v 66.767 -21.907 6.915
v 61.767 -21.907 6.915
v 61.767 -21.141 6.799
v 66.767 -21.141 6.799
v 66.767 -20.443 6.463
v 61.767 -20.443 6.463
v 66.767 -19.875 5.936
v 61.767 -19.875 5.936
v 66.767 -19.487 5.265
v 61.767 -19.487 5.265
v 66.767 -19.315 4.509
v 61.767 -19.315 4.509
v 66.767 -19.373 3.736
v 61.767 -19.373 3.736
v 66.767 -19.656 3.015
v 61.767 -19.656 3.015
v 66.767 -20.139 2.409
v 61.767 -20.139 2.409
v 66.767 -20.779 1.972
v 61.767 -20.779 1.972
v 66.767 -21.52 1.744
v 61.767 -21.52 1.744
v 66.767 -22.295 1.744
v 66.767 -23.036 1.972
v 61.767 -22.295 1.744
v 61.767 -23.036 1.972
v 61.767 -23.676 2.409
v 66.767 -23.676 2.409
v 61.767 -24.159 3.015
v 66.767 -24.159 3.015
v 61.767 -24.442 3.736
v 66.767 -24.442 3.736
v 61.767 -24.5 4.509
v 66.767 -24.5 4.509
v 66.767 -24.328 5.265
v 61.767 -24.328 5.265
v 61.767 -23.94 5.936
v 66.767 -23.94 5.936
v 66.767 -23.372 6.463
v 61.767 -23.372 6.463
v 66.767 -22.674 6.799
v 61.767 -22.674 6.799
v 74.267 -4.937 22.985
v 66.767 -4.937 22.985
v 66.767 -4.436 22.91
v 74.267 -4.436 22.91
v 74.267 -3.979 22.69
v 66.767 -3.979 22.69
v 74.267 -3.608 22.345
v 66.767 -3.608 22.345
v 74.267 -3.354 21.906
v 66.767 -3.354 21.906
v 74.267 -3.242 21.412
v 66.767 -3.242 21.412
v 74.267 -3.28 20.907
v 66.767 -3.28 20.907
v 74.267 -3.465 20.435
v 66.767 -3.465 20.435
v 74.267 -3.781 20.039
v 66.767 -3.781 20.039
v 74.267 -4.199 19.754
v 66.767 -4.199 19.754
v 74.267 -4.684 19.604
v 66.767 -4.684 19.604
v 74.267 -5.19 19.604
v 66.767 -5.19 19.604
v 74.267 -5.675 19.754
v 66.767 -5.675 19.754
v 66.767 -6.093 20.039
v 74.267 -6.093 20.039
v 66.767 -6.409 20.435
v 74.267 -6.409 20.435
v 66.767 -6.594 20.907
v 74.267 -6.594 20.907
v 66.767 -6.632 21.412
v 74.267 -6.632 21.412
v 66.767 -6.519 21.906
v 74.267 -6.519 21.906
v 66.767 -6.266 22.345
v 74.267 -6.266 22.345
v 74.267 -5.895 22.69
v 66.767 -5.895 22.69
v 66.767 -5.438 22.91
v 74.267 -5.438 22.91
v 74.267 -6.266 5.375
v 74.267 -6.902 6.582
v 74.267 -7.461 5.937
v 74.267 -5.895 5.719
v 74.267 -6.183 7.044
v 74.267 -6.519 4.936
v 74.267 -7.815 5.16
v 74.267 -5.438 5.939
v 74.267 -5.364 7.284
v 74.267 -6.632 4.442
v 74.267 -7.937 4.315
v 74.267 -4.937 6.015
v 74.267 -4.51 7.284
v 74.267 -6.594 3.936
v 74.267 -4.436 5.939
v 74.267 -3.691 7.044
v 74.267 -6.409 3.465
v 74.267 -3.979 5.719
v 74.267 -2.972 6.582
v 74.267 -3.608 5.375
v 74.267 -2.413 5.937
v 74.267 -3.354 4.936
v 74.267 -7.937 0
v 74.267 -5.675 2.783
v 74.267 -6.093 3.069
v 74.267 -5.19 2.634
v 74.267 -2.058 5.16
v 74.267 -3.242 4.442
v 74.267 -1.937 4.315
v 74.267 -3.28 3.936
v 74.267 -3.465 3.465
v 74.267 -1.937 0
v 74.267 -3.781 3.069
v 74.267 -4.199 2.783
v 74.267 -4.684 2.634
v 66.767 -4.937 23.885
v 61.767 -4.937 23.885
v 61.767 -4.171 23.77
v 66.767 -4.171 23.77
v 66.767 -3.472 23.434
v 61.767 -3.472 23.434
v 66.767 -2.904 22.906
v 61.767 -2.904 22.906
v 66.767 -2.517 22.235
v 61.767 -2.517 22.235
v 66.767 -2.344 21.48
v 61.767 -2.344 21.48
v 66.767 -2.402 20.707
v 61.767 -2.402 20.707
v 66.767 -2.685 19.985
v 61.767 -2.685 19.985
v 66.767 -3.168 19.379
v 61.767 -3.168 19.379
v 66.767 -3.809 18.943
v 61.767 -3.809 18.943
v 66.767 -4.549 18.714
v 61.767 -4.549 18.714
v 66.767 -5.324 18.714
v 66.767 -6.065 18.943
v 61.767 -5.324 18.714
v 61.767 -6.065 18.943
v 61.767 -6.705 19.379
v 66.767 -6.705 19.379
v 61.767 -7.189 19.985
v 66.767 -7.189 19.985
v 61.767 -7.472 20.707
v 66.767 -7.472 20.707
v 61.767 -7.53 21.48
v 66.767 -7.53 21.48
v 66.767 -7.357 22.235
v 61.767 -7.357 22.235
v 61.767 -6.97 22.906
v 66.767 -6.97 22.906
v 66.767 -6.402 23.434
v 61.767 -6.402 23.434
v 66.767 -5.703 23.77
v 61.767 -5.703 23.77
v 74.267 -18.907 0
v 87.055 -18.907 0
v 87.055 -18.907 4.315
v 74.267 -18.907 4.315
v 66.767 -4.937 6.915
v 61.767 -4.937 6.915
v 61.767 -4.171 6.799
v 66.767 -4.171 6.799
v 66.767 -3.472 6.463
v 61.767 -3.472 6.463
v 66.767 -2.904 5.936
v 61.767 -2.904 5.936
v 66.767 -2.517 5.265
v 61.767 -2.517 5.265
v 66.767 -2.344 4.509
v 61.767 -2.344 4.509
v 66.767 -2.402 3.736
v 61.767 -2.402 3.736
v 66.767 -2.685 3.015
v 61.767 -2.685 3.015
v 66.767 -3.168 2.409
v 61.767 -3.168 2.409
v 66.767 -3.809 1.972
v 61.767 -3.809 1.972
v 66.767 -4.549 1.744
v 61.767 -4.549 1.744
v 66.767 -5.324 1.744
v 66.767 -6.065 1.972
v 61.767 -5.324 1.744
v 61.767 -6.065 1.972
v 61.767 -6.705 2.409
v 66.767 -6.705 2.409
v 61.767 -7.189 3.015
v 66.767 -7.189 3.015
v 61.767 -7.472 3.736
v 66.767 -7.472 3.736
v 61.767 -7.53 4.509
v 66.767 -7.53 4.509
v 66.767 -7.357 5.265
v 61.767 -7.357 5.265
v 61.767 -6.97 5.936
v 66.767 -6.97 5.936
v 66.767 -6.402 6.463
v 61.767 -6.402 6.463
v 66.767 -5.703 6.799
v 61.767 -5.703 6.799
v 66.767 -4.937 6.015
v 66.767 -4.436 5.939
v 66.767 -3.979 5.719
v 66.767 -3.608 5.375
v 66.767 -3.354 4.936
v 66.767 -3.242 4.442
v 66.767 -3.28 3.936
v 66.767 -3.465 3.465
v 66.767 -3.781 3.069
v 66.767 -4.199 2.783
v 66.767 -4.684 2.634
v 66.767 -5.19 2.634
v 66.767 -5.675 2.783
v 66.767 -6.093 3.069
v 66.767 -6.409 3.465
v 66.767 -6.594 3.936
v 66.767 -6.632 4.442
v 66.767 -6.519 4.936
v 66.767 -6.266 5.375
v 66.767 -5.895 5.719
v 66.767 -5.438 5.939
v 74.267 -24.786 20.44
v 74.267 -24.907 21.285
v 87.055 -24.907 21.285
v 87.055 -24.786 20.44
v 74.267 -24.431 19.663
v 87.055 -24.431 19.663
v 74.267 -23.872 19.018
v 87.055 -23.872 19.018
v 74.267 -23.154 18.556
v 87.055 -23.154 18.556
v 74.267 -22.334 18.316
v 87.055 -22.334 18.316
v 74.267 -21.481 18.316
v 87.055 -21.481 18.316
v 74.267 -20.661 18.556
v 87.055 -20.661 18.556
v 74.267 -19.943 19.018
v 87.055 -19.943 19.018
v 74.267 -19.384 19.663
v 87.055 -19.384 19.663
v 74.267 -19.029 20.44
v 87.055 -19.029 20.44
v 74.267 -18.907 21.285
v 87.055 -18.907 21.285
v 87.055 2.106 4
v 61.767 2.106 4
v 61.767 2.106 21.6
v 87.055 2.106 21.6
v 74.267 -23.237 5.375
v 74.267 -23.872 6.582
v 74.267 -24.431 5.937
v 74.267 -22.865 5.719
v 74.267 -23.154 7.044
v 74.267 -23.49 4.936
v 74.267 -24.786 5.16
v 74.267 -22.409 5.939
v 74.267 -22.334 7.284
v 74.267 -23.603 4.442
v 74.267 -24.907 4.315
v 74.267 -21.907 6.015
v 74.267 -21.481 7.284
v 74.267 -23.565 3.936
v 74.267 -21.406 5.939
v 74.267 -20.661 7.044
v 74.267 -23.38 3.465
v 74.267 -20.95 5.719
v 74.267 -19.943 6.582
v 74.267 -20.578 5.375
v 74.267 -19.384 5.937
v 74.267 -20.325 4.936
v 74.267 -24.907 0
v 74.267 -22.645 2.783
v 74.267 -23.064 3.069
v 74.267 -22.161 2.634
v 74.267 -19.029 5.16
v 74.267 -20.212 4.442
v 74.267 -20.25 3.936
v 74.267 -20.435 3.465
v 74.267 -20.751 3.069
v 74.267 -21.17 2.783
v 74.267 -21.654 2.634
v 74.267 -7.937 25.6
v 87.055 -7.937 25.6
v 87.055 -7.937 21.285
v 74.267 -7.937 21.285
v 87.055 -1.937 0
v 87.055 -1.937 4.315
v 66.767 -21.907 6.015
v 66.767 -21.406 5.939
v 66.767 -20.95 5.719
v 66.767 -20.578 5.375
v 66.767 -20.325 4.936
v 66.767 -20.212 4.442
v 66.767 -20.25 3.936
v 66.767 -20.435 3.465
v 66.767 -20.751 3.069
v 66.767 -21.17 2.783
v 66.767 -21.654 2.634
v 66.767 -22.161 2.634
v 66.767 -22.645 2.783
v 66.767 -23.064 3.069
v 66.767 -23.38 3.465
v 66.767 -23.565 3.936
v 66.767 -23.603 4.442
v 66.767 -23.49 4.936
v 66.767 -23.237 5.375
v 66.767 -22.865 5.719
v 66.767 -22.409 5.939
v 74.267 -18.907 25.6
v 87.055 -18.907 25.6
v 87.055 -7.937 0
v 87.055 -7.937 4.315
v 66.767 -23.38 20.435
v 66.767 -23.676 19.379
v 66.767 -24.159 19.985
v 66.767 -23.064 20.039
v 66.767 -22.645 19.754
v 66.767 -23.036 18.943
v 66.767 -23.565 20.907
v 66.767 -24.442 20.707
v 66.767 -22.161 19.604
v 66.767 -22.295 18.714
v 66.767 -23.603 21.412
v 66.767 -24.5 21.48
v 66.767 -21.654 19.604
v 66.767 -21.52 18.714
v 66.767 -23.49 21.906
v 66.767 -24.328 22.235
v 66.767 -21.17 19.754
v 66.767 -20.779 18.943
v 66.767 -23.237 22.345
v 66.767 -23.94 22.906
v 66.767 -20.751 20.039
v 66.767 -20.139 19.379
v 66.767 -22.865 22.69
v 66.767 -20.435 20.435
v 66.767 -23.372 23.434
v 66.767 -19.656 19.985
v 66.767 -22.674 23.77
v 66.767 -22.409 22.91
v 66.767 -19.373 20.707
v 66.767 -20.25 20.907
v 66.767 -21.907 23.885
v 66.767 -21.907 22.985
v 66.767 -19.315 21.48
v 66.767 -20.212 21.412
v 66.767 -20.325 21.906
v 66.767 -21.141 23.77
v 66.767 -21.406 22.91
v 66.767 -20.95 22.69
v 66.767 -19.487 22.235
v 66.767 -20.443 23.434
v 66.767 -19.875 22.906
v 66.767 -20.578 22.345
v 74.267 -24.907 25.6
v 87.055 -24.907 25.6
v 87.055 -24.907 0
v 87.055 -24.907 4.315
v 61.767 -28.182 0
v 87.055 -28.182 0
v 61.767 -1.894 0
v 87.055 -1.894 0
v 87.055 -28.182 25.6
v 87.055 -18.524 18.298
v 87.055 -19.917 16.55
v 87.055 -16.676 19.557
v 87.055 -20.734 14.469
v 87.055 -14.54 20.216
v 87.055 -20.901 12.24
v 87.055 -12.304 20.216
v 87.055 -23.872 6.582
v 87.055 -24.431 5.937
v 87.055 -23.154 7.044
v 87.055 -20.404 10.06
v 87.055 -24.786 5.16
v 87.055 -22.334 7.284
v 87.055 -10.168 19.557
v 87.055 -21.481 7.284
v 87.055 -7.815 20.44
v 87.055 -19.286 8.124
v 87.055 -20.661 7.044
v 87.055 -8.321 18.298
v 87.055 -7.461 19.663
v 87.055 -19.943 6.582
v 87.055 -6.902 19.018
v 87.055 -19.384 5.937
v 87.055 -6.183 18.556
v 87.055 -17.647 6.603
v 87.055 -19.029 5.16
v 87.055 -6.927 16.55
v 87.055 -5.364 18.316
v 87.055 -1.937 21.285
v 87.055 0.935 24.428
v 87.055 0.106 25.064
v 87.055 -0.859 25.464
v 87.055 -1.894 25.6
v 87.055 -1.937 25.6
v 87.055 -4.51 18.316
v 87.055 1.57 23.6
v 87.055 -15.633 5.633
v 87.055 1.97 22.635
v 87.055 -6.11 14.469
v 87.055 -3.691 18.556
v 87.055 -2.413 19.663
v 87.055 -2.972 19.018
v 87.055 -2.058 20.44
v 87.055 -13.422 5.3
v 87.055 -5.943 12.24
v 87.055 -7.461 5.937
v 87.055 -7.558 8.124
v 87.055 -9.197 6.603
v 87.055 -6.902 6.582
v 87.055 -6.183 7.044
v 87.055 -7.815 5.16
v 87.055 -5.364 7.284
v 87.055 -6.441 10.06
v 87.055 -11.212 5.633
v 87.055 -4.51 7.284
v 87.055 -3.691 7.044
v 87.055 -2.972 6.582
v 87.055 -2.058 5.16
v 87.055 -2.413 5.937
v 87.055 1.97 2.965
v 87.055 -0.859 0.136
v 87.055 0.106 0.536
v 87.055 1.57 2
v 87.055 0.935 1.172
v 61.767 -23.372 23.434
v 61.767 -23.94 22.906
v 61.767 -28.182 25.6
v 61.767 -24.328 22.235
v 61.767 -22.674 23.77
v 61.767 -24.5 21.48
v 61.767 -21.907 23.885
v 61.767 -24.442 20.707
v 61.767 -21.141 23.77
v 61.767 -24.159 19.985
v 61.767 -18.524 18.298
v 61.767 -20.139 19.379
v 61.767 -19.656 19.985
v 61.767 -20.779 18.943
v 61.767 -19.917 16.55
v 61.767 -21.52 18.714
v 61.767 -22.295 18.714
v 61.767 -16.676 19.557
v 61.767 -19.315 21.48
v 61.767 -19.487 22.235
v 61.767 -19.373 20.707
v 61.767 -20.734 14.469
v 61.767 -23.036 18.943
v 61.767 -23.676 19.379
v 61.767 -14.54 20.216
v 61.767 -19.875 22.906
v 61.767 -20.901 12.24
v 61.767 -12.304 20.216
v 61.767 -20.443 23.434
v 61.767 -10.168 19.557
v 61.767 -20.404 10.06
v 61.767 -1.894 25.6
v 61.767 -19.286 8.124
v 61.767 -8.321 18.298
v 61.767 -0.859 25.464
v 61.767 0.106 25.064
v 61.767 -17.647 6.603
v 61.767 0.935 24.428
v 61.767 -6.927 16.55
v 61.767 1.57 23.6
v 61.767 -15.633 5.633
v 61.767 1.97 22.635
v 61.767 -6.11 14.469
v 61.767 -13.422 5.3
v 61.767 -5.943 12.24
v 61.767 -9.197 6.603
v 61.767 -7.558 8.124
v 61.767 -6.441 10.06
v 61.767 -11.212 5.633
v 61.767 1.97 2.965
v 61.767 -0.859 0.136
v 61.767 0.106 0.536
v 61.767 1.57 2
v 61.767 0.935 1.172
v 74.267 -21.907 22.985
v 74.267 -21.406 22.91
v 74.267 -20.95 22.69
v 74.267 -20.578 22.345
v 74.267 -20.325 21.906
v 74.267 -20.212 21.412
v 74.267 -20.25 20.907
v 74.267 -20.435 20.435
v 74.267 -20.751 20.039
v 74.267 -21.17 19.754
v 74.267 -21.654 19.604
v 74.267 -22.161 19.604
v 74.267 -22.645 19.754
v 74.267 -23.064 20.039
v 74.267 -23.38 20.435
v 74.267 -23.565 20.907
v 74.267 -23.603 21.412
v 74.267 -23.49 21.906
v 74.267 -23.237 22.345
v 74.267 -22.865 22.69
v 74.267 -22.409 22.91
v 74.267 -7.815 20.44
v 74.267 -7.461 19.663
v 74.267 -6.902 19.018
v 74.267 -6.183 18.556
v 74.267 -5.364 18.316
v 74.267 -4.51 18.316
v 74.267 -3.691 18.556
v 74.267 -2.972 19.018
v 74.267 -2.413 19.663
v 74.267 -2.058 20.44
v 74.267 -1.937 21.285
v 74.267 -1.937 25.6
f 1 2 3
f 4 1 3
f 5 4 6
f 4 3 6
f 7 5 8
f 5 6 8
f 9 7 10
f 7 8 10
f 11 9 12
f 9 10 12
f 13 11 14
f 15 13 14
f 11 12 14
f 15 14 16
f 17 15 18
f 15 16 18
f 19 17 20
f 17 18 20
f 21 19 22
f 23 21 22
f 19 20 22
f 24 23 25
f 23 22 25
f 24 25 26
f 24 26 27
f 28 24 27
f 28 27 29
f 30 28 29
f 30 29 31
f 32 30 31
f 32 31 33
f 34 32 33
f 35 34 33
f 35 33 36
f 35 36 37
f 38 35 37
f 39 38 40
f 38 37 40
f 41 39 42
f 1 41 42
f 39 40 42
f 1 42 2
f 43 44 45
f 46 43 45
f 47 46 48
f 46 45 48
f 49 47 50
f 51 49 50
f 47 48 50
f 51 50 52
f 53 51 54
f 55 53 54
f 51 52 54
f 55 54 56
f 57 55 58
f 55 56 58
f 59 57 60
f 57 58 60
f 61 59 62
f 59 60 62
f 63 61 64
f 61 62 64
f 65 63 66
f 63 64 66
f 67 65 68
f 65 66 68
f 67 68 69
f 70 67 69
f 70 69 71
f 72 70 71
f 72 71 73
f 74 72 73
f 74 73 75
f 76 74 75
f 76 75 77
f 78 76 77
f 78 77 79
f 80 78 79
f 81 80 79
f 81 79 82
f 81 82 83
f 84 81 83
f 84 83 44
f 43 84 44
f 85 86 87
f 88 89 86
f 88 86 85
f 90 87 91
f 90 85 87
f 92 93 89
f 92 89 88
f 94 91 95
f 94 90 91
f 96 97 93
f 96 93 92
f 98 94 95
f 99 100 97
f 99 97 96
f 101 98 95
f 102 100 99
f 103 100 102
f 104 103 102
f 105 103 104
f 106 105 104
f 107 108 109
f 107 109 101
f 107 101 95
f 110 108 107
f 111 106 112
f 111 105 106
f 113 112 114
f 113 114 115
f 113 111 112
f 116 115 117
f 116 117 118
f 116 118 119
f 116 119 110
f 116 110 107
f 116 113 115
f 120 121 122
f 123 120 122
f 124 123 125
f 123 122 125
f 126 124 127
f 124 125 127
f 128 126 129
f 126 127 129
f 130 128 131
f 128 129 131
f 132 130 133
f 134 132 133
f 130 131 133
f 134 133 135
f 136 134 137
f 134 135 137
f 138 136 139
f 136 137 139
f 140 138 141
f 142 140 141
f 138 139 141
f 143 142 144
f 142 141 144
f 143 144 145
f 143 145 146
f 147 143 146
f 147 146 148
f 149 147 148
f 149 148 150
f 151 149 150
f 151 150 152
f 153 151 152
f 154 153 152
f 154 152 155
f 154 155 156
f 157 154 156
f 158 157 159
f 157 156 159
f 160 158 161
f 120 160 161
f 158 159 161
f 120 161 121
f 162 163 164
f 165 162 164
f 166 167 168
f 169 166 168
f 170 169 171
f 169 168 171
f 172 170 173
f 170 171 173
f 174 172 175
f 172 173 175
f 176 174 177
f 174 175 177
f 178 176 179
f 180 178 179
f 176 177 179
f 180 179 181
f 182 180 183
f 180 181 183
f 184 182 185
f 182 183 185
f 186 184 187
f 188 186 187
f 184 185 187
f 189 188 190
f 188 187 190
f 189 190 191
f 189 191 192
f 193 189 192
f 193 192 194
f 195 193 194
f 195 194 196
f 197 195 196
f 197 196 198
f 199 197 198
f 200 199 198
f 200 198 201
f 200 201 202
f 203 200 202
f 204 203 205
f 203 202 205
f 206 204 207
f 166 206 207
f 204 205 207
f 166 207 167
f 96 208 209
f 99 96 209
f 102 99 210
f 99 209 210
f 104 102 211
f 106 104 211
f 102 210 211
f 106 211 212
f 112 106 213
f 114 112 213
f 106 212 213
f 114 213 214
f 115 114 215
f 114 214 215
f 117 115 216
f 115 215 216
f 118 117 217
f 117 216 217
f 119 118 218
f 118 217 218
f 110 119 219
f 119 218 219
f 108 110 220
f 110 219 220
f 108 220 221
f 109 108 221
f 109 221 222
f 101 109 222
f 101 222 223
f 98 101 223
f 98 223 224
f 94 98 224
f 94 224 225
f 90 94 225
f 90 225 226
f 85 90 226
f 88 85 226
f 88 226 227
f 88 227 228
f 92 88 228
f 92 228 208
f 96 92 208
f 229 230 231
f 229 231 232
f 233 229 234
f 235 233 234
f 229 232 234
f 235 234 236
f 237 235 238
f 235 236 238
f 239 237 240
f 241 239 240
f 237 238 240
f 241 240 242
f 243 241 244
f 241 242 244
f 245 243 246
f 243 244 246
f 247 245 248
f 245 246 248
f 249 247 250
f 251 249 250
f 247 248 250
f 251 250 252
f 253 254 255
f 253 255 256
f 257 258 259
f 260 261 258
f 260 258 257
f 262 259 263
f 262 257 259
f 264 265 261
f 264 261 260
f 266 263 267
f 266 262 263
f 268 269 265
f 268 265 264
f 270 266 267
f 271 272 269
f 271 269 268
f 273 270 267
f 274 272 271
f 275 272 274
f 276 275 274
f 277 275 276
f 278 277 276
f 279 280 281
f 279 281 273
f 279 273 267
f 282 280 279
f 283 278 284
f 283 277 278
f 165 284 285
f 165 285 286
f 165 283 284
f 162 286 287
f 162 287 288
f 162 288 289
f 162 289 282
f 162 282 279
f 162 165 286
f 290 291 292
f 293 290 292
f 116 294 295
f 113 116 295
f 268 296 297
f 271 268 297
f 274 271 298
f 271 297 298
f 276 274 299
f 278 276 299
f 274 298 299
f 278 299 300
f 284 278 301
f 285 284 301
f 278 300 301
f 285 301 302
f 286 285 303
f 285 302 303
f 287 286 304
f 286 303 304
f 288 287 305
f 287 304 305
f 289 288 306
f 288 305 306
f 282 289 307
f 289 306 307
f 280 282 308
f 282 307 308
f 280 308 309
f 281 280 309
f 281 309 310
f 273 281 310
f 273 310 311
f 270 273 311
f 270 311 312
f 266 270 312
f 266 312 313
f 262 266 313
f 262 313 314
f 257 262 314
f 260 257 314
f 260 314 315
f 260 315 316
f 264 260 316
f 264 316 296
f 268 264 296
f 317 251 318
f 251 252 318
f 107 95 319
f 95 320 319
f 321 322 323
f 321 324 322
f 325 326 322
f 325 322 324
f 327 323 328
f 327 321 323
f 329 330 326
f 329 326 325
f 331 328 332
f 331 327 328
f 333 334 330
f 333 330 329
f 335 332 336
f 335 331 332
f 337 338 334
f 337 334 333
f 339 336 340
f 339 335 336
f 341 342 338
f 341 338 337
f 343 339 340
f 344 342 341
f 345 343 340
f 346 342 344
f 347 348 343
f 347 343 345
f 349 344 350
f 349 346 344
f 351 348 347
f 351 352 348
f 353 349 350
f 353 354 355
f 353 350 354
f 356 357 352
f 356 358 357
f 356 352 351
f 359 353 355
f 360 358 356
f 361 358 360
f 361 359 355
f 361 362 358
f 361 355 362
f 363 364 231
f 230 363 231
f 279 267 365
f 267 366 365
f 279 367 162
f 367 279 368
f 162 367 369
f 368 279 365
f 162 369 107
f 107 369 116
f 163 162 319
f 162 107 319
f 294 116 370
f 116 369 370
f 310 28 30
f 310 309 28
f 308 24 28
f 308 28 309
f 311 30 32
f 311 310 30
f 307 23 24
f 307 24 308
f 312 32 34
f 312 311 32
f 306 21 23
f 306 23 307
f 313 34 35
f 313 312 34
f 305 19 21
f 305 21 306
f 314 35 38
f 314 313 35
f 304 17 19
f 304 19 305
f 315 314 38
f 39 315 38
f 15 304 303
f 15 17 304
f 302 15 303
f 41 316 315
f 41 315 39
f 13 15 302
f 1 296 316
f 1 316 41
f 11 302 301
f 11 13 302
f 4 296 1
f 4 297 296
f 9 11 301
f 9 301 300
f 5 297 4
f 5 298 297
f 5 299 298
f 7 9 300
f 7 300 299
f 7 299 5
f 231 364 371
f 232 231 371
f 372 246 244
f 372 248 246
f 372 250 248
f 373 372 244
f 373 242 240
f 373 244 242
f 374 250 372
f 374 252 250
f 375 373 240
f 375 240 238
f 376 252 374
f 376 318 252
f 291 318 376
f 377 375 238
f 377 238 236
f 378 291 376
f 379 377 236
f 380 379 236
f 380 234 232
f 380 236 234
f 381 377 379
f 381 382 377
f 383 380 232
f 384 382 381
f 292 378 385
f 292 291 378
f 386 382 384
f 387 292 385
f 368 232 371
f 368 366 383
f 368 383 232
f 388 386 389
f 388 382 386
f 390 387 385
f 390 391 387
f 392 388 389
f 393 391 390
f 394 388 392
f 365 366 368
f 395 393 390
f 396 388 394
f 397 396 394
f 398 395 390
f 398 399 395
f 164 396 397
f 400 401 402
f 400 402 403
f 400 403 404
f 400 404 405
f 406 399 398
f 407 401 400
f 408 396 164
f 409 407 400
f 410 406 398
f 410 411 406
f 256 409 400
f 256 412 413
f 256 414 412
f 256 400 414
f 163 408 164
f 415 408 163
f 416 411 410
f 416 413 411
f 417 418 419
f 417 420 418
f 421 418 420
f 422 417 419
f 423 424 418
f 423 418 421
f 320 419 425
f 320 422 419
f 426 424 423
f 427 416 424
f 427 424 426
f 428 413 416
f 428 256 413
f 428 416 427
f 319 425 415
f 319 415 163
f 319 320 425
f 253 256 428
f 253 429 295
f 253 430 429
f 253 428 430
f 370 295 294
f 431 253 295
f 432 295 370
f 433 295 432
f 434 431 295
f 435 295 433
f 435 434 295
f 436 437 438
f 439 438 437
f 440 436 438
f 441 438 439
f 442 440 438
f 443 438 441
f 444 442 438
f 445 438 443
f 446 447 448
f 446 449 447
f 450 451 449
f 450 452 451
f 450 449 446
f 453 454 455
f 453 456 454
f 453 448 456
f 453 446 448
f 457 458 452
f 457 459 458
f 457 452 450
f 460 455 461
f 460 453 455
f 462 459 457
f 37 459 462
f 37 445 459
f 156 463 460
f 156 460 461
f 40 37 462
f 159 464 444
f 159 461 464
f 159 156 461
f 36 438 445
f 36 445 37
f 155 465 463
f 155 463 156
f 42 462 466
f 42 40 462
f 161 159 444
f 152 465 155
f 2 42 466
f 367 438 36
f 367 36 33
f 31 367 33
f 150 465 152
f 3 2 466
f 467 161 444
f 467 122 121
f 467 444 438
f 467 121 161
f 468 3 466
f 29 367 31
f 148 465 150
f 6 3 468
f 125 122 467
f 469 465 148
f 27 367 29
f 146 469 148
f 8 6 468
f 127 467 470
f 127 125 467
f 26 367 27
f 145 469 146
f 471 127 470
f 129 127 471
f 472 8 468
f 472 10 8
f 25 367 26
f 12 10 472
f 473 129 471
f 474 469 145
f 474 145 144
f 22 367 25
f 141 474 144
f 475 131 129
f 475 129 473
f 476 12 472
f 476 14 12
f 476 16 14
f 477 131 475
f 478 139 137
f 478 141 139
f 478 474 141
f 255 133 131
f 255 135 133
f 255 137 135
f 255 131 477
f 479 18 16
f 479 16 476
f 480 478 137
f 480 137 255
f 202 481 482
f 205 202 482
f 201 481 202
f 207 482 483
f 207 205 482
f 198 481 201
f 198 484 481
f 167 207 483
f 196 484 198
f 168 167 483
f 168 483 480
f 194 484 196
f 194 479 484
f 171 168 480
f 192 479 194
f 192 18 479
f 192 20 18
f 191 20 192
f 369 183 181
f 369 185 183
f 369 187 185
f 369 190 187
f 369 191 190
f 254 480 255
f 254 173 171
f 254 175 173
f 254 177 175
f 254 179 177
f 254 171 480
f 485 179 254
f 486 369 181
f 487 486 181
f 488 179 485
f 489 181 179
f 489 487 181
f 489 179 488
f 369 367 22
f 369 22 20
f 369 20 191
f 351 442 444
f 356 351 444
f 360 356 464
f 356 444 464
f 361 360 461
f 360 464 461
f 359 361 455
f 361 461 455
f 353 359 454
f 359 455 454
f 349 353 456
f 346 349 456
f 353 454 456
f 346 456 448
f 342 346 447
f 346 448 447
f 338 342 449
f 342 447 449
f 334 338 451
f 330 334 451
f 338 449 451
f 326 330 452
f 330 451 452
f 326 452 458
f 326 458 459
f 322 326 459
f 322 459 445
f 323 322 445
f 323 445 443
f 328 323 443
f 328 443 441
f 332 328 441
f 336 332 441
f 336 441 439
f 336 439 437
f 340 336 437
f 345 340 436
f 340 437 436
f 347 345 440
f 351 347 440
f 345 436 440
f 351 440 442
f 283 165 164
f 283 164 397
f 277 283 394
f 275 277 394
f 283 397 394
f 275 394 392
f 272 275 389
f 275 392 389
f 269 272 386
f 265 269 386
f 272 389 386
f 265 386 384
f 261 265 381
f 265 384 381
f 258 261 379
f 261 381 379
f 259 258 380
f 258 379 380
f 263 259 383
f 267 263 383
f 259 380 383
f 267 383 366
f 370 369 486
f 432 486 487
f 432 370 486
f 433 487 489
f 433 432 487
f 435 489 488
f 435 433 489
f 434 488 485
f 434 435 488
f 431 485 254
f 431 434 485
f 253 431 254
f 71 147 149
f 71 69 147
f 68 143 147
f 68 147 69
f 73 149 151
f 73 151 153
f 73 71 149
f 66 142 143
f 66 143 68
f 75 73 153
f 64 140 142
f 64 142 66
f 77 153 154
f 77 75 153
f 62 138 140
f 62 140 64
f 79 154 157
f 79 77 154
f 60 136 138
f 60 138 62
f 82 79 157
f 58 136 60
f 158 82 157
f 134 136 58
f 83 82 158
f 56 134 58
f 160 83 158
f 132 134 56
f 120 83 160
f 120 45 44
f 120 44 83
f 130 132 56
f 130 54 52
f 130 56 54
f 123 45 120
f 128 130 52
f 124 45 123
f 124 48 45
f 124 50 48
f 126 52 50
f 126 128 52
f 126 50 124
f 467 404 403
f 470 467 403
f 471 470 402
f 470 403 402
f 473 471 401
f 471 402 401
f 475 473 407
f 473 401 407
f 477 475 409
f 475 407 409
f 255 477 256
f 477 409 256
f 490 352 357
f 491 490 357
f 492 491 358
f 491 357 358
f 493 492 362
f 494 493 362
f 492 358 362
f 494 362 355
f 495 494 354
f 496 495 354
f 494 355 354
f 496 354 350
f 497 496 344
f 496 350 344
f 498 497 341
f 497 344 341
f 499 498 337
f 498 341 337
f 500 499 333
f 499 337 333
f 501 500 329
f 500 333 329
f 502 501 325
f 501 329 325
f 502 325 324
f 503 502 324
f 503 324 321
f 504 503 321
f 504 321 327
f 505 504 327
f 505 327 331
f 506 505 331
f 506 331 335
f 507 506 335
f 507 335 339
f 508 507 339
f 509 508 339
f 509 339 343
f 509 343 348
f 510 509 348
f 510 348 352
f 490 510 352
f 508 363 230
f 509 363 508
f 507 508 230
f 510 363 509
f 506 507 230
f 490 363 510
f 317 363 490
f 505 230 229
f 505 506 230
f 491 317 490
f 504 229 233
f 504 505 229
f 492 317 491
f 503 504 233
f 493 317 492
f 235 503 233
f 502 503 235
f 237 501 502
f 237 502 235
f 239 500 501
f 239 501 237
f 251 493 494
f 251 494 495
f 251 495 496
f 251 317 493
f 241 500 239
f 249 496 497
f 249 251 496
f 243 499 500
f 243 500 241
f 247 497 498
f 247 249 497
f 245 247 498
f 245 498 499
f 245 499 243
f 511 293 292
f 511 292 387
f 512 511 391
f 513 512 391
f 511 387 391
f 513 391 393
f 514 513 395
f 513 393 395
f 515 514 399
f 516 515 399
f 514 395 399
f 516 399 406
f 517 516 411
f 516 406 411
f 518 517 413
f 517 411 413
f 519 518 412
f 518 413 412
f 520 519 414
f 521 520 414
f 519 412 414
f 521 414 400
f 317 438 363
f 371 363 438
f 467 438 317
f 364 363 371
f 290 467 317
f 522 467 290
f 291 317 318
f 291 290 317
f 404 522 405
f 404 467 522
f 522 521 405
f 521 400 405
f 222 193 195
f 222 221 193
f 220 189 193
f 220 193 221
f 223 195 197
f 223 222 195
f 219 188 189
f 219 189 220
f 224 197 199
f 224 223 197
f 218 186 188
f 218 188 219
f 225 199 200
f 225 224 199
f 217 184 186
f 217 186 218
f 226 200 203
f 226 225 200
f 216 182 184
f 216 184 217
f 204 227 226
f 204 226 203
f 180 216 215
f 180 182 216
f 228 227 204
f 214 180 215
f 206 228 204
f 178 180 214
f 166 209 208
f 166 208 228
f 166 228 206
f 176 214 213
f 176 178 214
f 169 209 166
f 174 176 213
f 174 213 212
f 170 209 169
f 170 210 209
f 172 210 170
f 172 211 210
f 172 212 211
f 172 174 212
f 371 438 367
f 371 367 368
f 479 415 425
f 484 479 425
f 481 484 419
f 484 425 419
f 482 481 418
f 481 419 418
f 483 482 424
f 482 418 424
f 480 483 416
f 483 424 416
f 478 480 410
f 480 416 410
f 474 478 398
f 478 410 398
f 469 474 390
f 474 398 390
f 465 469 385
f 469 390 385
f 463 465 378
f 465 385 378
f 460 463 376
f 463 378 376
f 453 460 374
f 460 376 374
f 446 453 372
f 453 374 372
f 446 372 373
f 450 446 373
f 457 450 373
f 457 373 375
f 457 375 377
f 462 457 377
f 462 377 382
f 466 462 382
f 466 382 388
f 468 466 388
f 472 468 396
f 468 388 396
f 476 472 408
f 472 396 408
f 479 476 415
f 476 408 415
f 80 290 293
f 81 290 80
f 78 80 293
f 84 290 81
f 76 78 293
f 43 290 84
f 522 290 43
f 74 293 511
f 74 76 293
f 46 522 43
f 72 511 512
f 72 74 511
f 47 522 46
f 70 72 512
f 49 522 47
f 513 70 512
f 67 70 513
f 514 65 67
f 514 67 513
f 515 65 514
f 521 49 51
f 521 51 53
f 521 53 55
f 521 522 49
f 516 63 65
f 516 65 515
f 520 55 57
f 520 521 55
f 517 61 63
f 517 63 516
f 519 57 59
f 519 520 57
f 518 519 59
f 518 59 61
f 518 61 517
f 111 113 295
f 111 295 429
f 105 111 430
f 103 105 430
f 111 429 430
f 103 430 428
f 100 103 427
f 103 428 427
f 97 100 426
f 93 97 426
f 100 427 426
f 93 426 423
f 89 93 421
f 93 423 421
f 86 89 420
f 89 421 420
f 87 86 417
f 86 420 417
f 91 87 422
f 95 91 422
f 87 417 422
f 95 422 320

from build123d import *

# Parameters (mm, degrees)
ESQUISSE1_W                  = 59
ESQUISSE1_H                  = 140
ESQUISSE1_R                  = 4
BOSS_EXTRU_1_DEPTH           = 25.6
ESQUISSE2_R                  = 7.5
ESQUISSE2_R_2                = 2.6
ENL_V_MAT_EXTRU_1_DEPTH      = 5
ESQUISSE3_R                  = 7.5
ENL_V_MAT_EXTRU_2_DEPTH      = 82
ESQUISSE4_R                  = 2.6
ENL_V_MAT_EXTRU_3_DEPTH      = 5
CONG_1_R                     = 4
ESQUISSE5_R                  = 1.7
ENL_V_MAT_EXTRU_4_DEPTH      = 71
ENL_V_MAT_EXTRU_5_DEPTH      = 17
ENL_V_MAT_EXTRU_5_DEPTH_BACK = 17
ESQUISSE7_W                  = 129.758897747
ESQUISSE7_H                  = 47.788995409
ENL_V_MAT_EXTRU_6_DEPTH      = 109.711687575
ESQUISSE8_W                  = 39.97313833
ESQUISSE8_H                  = 58.643042411
ENL_V_MAT_EXTRU_7_DEPTH      = 33.711687575


with BuildPart() as part:
    # Esquisse1 → Boss.-Extru.1 (new body)
    with BuildSketch(Plane.XY):
        with Locations((91.26696752, -67.893899255)):
            Rectangle(ESQUISSE1_W, ESQUISSE1_H)
        with Locations((115.36696752, -108.722960996)):
            Circle(ESQUISSE1_R, mode=Mode.SUBTRACT)
        with Locations((115.36696752, -26.122960996)):
            Circle(ESQUISSE1_R, mode=Mode.SUBTRACT)
        with Locations((74.86696752, -56.866619083)):
            Circle(ESQUISSE1_R, mode=Mode.SUBTRACT)
        with Locations((67.16696752, -107.582960996)):
            Circle(ESQUISSE1_R, mode=Mode.SUBTRACT)
        with Locations((67.16696752, -32.342960996)):
            Circle(ESQUISSE1_R, mode=Mode.SUBTRACT)
    extrude(amount=BOSS_EXTRU_1_DEPTH)

    # Esquisse2 → Enlèv. mat.-Extru.1 (cut)
    with BuildSketch(Plane(origin=(120.76696752, 0, 0), x_dir=(0, 0, -1), z_dir=(1, 0, 0))):
        with Locations((-12.8, -95.02835166)):
            Circle(ESQUISSE2_R)
        with Locations((-21.285281374, -103.629375049)):
            Circle(ESQUISSE2_R_2)
        with Locations((-4.314718626, -103.629375049)):
            Circle(ESQUISSE2_R_2)
        with Locations((-4.314718626, -86.427328272)):
            Circle(ESQUISSE2_R_2)
        with Locations((-21.285281374, -86.427328272)):
            Circle(ESQUISSE2_R_2)
        with Locations((-21.285281374, -133.513633034)):
            Circle(ESQUISSE2_R_2)
        with Locations((-12.8, -125.02835166)):
            Circle(ESQUISSE2_R)
        with Locations((-4.314718626, -133.513633034)):
            Circle(ESQUISSE2_R_2)
        with Locations((-4.314718626, -69.225281495)):
            Circle(ESQUISSE2_R_2)
        with Locations((-21.285281374, -69.225281495)):
            Circle(ESQUISSE2_R_2)
        with Locations((-12.8, -77.826304883)):
            Circle(ESQUISSE2_R)
        with Locations((-4.314718626, -52.023234718)):
            Circle(ESQUISSE2_R_2)
        with Locations((-21.285281374, -52.023234718)):
            Circle(ESQUISSE2_R_2)
        with Locations((-12.8, -60.624258106)):
            Circle(ESQUISSE2_R)
        with Locations((-4.314718626, -34.821187941)):
            Circle(ESQUISSE2_R_2)
        with Locations((-21.285281374, -34.821187941)):
            Circle(ESQUISSE2_R_2)
        with Locations((-12.8, -43.422211329)):
            Circle(ESQUISSE2_R)
        with Locations((-12.8, -13.422211329)):
            Circle(ESQUISSE2_R)
        with Locations((-21.285281374, -4.936929955)):
            Circle(ESQUISSE2_R_2)
        with Locations((-4.314718626, -4.936929955)):
            Circle(ESQUISSE2_R_2)
        with Locations((-4.314718626, -116.543070286)):
            Circle(ESQUISSE2_R_2)
        with Locations((-21.285281374, -116.543070286)):
            Circle(ESQUISSE2_R_2)
        with Locations((-4.314718626, -21.907492704)):
            Circle(ESQUISSE2_R_2)
        with Locations((-21.285281374, -21.907492704)):
            Circle(ESQUISSE2_R_2)
    extrude(amount=-ENL_V_MAT_EXTRU_1_DEPTH, mode=Mode.SUBTRACT)

    # Esquisse3 → Enlèv. mat.-Extru.2 (cut)
    with BuildSketch(Plane(origin=(120.76696752, 0, 0), x_dir=(0, 0, -1), z_dir=(1, 0, 0))):
        with Locations((-12.8, -125.02835166)):
            Circle(ESQUISSE3_R)
        with Locations((-12.8, -95.02835166)):
            Circle(ESQUISSE3_R)
        with Locations((-12.8, -77.826304883)):
            Circle(ESQUISSE3_R)
        with Locations((-12.8, -60.624258106)):
            Circle(ESQUISSE3_R)
        with Locations((-12.8, -43.422211329)):
            Circle(ESQUISSE3_R)
        with Locations((-12.8, -13.422211329)):
            Circle(ESQUISSE3_R)
    extrude(amount=-ENL_V_MAT_EXTRU_2_DEPTH, mode=Mode.SUBTRACT)

    # Esquisse4 → Enlèv. mat.-Extru.3 (cut)
    with BuildSketch(Plane.ZY.offset(-61.76696752)):
        with Locations((21.285281374, -4.936929955)):
            Circle(ESQUISSE4_R)
        with Locations((4.314718626, -4.936929955)):
            Circle(ESQUISSE4_R)
        with Locations((21.285281374, -34.936929955)):
            Circle(ESQUISSE4_R)
        with Locations((4.314718626, -34.936929955)):
            Circle(ESQUISSE4_R)
        with Locations((4.314718626, -51.907492704)):
            Circle(ESQUISSE4_R)
        with Locations((21.285281374, -51.907492704)):
            Circle(ESQUISSE4_R)
        with Locations((4.314718626, -69.341023509)):
            Circle(ESQUISSE4_R)
        with Locations((21.285281374, -69.341023509)):
            Circle(ESQUISSE4_R)
        with Locations((4.314718626, -86.311586257)):
            Circle(ESQUISSE4_R)
        with Locations((21.285281374, -86.311586257)):
            Circle(ESQUISSE4_R)
        with Locations((4.314718626, -103.745117063)):
            Circle(ESQUISSE4_R)
        with Locations((21.285281374, -103.745117063)):
            Circle(ESQUISSE4_R)
        with Locations((4.314718626, -133.513633034)):
            Circle(ESQUISSE4_R)
        with Locations((21.285281374, -133.513633034)):
            Circle(ESQUISSE4_R)
        with Locations((4.314718626, -21.907492704)):
            Circle(ESQUISSE4_R)
        with Locations((21.285281374, -21.907492704)):
            Circle(ESQUISSE4_R)
        with Locations((4.314718626, -116.543070286)):
            Circle(ESQUISSE4_R)
        with Locations((21.285281374, -116.543070286)):
            Circle(ESQUISSE4_R)
    extrude(amount=-ENL_V_MAT_EXTRU_3_DEPTH, mode=Mode.SUBTRACT)

    # Congé1
    cong_1_edges = [part.edges().sort_by_distance(p)[0] for p in [
        (91.26696752, 2.106100745, 25.6),
        (91.26696752, 2.106100745, 0),
        (91.26696752, -137.893899255, 0),
        (91.26696752, -137.893899255, 25.6),
    ]]
    fillet(cong_1_edges, radius=CONG_1_R)

    # Esquisse5 → Enlèv. mat.-Extru.4 (cut)
    with BuildSketch(Plane.ZY.offset(-61.76696752)):
        with Locations((21.285281374, -4.936929955)):
            Circle(ESQUISSE5_R)
        with Locations((21.285281374, -21.907492704)):
            Circle(ESQUISSE5_R)
        with Locations((21.285281374, -34.936929955)):
            Circle(ESQUISSE5_R)
        with Locations((21.285281374, -51.907492704)):
            Circle(ESQUISSE5_R)
        with Locations((21.285281374, -69.341023509)):
            Circle(ESQUISSE5_R)
        with Locations((21.285281374, -86.311586257)):
            Circle(ESQUISSE5_R)
        with Locations((21.285281374, -103.745117063)):
            Circle(ESQUISSE5_R)
        with Locations((21.285281374, -116.543070286)):
            Circle(ESQUISSE5_R)
        with Locations((21.285281374, -133.513633034)):
            Circle(ESQUISSE5_R)
        with Locations((4.314718626, -4.936929955)):
            Circle(ESQUISSE5_R)
        with Locations((4.314718626, -21.907492704)):
            Circle(ESQUISSE5_R)
        with Locations((4.314718626, -34.936929955)):
            Circle(ESQUISSE5_R)
        with Locations((4.314718626, -51.907492704)):
            Circle(ESQUISSE5_R)
        with Locations((4.314718626, -69.341023509)):
            Circle(ESQUISSE5_R)
        with Locations((4.314718626, -86.311586257)):
            Circle(ESQUISSE5_R)
        with Locations((4.314718626, -103.745117063)):
            Circle(ESQUISSE5_R)
        with Locations((4.314718626, -116.543070286)):
            Circle(ESQUISSE5_R)
        with Locations((4.314718626, -133.513633034)):
            Circle(ESQUISSE5_R)
    extrude(amount=-ENL_V_MAT_EXTRU_4_DEPTH, mode=Mode.SUBTRACT)

    # Esquisse6 → Enlèv. mat.-Extru.5 (cut, two sides)
    with BuildSketch(Plane.ZY.offset(-91.26696752)) as enl_v_mat_extru_5_sk:
        with BuildLine():
            Line((21.285281374, -1.936929955), (29.285281374, -1.936929955))
            ThreePointArc((29.285281374, -1.936929955), (32.285281374, -4.936929955), (29.285281374, -7.936929955))
            Line((29.285281374, -7.936929955), (21.285281374, -7.936929955))
            ThreePointArc((21.285281374, -7.936929955), (18.285281374, -4.936929955), (21.285281374, -1.936929955))
        make_face()
        with BuildLine():
            Line((21.285281374, -18.907492704), (29.285281374, -18.907492704))
            ThreePointArc((29.285281374, -18.907492704), (32.285281374, -21.907492704), (29.285281374, -24.907492704))
            Line((29.285281374, -24.907492704), (21.285281374, -24.907492704))
            ThreePointArc((21.285281374, -24.907492704), (18.285281374, -21.907492704), (21.285281374, -18.907492704))
        make_face()
        with BuildLine():
            Line((21.285281374, -31.936929955), (29.285281374, -31.936929955))
            ThreePointArc((29.285281374, -31.936929955), (32.285281374, -34.936929955), (29.285281374, -37.936929955))
            Line((29.285281374, -37.936929955), (21.285281374, -37.936929955))
            ThreePointArc((21.285281374, -37.936929955), (18.285281374, -34.936929955), (21.285281374, -31.936929955))
        make_face()
        with BuildLine():
            Line((21.285281374, -48.907492704), (29.285281374, -48.907492704))
            ThreePointArc((29.285281374, -48.907492704), (32.285281374, -51.907492704), (29.285281374, -54.907492704))
            Line((29.285281374, -54.907492704), (21.285281374, -54.907492704))
            ThreePointArc((21.285281374, -54.907492704), (18.285281374, -51.907492704), (21.285281374, -48.907492704))
        make_face()
        with BuildLine():
            Line((21.285281374, -66.341023509), (29.285281374, -66.341023509))
            ThreePointArc((29.285281374, -66.341023509), (32.285281374, -69.341023509), (29.285281374, -72.341023509))
            Line((29.285281374, -72.341023509), (21.285281374, -72.341023509))
            ThreePointArc((21.285281374, -72.341023509), (18.285281374, -69.341023509), (21.285281374, -66.341023509))
        make_face()
        with BuildLine():
            Line((21.285281374, -83.311586257), (29.285281374, -83.311586257))
            ThreePointArc((29.285281374, -83.311586257), (32.285281374, -86.311586257), (29.285281374, -89.311586257))
            Line((29.285281374, -89.311586257), (21.285281374, -89.311586257))
            ThreePointArc((21.285281374, -89.311586257), (18.285281374, -86.311586257), (21.285281374, -83.311586257))
        make_face()
        with BuildLine():
            Line((21.285281374, -100.745117063), (29.285281374, -100.745117063))
            ThreePointArc((29.285281374, -100.745117063), (32.285281374, -103.745117063), (29.285281374, -106.745117063))
            Line((29.285281374, -106.745117063), (21.285281374, -106.745117063))
            ThreePointArc((21.285281374, -106.745117063), (18.285281374, -103.745117063), (21.285281374, -100.745117063))
        make_face()
        with BuildLine():
            Line((21.285281374, -113.543070286), (29.285281374, -113.543070286))
            ThreePointArc((29.285281374, -113.543070286), (32.285281374, -116.543070286), (29.285281374, -119.543070286))
            Line((29.285281374, -119.543070286), (21.285281374, -119.543070286))
            ThreePointArc((21.285281374, -119.543070286), (18.285281374, -116.543070286), (21.285281374, -113.543070286))
        make_face()
        with BuildLine():
            Line((21.285281374, -130.513633034), (29.285281374, -130.513633034))
            ThreePointArc((29.285281374, -130.513633034), (32.285281374, -133.513633034), (29.285281374, -136.513633034))
            Line((29.285281374, -136.513633034), (21.285281374, -136.513633034))
            ThreePointArc((21.285281374, -136.513633034), (18.285281374, -133.513633034), (21.285281374, -130.513633034))
        make_face()
        with BuildLine():
            Line((-3.685281374, -1.936929955), (4.314718626, -1.936929955))
            ThreePointArc((4.314718626, -1.936929955), (7.314718626, -4.936929955), (4.314718626, -7.936929955))
            Line((4.314718626, -7.936929955), (-3.685281374, -7.936929955))
            ThreePointArc((-3.685281374, -7.936929955), (-6.685281374, -4.936929955), (-3.685281374, -1.936929955))
        make_face()
        with BuildLine():
            Line((-3.685281374, -18.907492704), (4.314718626, -18.907492704))
            ThreePointArc((4.314718626, -18.907492704), (7.314718626, -21.907492704), (4.314718626, -24.907492704))
            Line((4.314718626, -24.907492704), (-3.685281374, -24.907492704))
            ThreePointArc((-3.685281374, -24.907492704), (-6.685281374, -21.907492704), (-3.685281374, -18.907492704))
        make_face()
        with BuildLine():
            Line((-3.685281374, -31.936929955), (4.314718626, -31.936929955))
            ThreePointArc((4.314718626, -31.936929955), (7.314718626, -34.936929955), (4.314718626, -37.936929955))
            Line((4.314718626, -37.936929955), (-3.685281374, -37.936929955))
            ThreePointArc((-3.685281374, -37.936929955), (-6.685281374, -34.936929955), (-3.685281374, -31.936929955))
        make_face()
        with BuildLine():
            Line((-3.685281374, -48.907492704), (4.314718626, -48.907492704))
            ThreePointArc((4.314718626, -48.907492704), (7.314718626, -51.907492704), (4.314718626, -54.907492704))
            Line((4.314718626, -54.907492704), (-3.685281374, -54.907492704))
            ThreePointArc((-3.685281374, -54.907492704), (-6.685281374, -51.907492704), (-3.685281374, -48.907492704))
        make_face()
        with BuildLine():
            Line((-3.685281374, -66.341023509), (4.314718626, -66.341023509))
            ThreePointArc((4.314718626, -66.341023509), (7.314718626, -69.341023509), (4.314718626, -72.341023509))
            Line((4.314718626, -72.341023509), (-3.685281374, -72.341023509))
            ThreePointArc((-3.685281374, -72.341023509), (-6.685281374, -69.341023509), (-3.685281374, -66.341023509))
        make_face()
        with BuildLine():
            Line((-3.685281374, -83.311586257), (4.314718626, -83.311586257))
            ThreePointArc((4.314718626, -83.311586257), (7.314718626, -86.311586257), (4.314718626, -89.311586257))
            Line((4.314718626, -89.311586257), (-3.685281374, -89.311586257))
            ThreePointArc((-3.685281374, -89.311586257), (-6.685281374, -86.311586257), (-3.685281374, -83.311586257))
        make_face()
        with BuildLine():
            Line((-3.685281374, -100.745117063), (4.314718626, -100.745117063))
            ThreePointArc((4.314718626, -100.745117063), (7.314718626, -103.745117063), (4.314718626, -106.745117063))
            Line((4.314718626, -106.745117063), (-3.685281374, -106.745117063))
            ThreePointArc((-3.685281374, -106.745117063), (-6.685281374, -103.745117063), (-3.685281374, -100.745117063))
        make_face()
        with BuildLine():
            Line((-3.685281374, -113.543070286), (4.314718626, -113.543070286))
            ThreePointArc((4.314718626, -113.543070286), (7.314718626, -116.543070286), (4.314718626, -119.543070286))
            Line((4.314718626, -119.543070286), (-3.685281374, -119.543070286))
            ThreePointArc((-3.685281374, -119.543070286), (-6.685281374, -116.543070286), (-3.685281374, -113.543070286))
        make_face()
        with BuildLine():
            Line((-3.685281374, -130.513633034), (4.314718626, -130.513633034))
            ThreePointArc((4.314718626, -130.513633034), (7.314718626, -133.513633034), (4.314718626, -136.513633034))
            Line((4.314718626, -136.513633034), (-3.685281374, -136.513633034))
            ThreePointArc((-3.685281374, -136.513633034), (-6.685281374, -133.513633034), (-3.685281374, -130.513633034))
        make_face()
    extrude(amount=ENL_V_MAT_EXTRU_5_DEPTH, mode=Mode.SUBTRACT)
    extrude(enl_v_mat_extru_5_sk.sketch, amount=-ENL_V_MAT_EXTRU_5_DEPTH_BACK, mode=Mode.SUBTRACT)

    # Esquisse7 → Enlèv. mat.-Extru.6 (cut)
    with BuildSketch(Plane.XZ.offset(137.893899255)):
        with Locations((94.762580062, 12.839847571)):
            Rectangle(ESQUISSE7_W, ESQUISSE7_H)
    extrude(amount=-ENL_V_MAT_EXTRU_6_DEPTH, mode=Mode.SUBTRACT)

    # Esquisse8 → Enlèv. mat.-Extru.7 (cut)
    with BuildSketch(Plane(origin=(120.76696752, 0, 0), x_dir=(0, 0, -1), z_dir=(1, 0, 0))):
        with Locations((-12.8, -13.422211329)):
            Rectangle(ESQUISSE8_W, ESQUISSE8_H)
    extrude(amount=-ENL_V_MAT_EXTRU_7_DEPTH, mode=Mode.SUBTRACT)


solid = part.part
